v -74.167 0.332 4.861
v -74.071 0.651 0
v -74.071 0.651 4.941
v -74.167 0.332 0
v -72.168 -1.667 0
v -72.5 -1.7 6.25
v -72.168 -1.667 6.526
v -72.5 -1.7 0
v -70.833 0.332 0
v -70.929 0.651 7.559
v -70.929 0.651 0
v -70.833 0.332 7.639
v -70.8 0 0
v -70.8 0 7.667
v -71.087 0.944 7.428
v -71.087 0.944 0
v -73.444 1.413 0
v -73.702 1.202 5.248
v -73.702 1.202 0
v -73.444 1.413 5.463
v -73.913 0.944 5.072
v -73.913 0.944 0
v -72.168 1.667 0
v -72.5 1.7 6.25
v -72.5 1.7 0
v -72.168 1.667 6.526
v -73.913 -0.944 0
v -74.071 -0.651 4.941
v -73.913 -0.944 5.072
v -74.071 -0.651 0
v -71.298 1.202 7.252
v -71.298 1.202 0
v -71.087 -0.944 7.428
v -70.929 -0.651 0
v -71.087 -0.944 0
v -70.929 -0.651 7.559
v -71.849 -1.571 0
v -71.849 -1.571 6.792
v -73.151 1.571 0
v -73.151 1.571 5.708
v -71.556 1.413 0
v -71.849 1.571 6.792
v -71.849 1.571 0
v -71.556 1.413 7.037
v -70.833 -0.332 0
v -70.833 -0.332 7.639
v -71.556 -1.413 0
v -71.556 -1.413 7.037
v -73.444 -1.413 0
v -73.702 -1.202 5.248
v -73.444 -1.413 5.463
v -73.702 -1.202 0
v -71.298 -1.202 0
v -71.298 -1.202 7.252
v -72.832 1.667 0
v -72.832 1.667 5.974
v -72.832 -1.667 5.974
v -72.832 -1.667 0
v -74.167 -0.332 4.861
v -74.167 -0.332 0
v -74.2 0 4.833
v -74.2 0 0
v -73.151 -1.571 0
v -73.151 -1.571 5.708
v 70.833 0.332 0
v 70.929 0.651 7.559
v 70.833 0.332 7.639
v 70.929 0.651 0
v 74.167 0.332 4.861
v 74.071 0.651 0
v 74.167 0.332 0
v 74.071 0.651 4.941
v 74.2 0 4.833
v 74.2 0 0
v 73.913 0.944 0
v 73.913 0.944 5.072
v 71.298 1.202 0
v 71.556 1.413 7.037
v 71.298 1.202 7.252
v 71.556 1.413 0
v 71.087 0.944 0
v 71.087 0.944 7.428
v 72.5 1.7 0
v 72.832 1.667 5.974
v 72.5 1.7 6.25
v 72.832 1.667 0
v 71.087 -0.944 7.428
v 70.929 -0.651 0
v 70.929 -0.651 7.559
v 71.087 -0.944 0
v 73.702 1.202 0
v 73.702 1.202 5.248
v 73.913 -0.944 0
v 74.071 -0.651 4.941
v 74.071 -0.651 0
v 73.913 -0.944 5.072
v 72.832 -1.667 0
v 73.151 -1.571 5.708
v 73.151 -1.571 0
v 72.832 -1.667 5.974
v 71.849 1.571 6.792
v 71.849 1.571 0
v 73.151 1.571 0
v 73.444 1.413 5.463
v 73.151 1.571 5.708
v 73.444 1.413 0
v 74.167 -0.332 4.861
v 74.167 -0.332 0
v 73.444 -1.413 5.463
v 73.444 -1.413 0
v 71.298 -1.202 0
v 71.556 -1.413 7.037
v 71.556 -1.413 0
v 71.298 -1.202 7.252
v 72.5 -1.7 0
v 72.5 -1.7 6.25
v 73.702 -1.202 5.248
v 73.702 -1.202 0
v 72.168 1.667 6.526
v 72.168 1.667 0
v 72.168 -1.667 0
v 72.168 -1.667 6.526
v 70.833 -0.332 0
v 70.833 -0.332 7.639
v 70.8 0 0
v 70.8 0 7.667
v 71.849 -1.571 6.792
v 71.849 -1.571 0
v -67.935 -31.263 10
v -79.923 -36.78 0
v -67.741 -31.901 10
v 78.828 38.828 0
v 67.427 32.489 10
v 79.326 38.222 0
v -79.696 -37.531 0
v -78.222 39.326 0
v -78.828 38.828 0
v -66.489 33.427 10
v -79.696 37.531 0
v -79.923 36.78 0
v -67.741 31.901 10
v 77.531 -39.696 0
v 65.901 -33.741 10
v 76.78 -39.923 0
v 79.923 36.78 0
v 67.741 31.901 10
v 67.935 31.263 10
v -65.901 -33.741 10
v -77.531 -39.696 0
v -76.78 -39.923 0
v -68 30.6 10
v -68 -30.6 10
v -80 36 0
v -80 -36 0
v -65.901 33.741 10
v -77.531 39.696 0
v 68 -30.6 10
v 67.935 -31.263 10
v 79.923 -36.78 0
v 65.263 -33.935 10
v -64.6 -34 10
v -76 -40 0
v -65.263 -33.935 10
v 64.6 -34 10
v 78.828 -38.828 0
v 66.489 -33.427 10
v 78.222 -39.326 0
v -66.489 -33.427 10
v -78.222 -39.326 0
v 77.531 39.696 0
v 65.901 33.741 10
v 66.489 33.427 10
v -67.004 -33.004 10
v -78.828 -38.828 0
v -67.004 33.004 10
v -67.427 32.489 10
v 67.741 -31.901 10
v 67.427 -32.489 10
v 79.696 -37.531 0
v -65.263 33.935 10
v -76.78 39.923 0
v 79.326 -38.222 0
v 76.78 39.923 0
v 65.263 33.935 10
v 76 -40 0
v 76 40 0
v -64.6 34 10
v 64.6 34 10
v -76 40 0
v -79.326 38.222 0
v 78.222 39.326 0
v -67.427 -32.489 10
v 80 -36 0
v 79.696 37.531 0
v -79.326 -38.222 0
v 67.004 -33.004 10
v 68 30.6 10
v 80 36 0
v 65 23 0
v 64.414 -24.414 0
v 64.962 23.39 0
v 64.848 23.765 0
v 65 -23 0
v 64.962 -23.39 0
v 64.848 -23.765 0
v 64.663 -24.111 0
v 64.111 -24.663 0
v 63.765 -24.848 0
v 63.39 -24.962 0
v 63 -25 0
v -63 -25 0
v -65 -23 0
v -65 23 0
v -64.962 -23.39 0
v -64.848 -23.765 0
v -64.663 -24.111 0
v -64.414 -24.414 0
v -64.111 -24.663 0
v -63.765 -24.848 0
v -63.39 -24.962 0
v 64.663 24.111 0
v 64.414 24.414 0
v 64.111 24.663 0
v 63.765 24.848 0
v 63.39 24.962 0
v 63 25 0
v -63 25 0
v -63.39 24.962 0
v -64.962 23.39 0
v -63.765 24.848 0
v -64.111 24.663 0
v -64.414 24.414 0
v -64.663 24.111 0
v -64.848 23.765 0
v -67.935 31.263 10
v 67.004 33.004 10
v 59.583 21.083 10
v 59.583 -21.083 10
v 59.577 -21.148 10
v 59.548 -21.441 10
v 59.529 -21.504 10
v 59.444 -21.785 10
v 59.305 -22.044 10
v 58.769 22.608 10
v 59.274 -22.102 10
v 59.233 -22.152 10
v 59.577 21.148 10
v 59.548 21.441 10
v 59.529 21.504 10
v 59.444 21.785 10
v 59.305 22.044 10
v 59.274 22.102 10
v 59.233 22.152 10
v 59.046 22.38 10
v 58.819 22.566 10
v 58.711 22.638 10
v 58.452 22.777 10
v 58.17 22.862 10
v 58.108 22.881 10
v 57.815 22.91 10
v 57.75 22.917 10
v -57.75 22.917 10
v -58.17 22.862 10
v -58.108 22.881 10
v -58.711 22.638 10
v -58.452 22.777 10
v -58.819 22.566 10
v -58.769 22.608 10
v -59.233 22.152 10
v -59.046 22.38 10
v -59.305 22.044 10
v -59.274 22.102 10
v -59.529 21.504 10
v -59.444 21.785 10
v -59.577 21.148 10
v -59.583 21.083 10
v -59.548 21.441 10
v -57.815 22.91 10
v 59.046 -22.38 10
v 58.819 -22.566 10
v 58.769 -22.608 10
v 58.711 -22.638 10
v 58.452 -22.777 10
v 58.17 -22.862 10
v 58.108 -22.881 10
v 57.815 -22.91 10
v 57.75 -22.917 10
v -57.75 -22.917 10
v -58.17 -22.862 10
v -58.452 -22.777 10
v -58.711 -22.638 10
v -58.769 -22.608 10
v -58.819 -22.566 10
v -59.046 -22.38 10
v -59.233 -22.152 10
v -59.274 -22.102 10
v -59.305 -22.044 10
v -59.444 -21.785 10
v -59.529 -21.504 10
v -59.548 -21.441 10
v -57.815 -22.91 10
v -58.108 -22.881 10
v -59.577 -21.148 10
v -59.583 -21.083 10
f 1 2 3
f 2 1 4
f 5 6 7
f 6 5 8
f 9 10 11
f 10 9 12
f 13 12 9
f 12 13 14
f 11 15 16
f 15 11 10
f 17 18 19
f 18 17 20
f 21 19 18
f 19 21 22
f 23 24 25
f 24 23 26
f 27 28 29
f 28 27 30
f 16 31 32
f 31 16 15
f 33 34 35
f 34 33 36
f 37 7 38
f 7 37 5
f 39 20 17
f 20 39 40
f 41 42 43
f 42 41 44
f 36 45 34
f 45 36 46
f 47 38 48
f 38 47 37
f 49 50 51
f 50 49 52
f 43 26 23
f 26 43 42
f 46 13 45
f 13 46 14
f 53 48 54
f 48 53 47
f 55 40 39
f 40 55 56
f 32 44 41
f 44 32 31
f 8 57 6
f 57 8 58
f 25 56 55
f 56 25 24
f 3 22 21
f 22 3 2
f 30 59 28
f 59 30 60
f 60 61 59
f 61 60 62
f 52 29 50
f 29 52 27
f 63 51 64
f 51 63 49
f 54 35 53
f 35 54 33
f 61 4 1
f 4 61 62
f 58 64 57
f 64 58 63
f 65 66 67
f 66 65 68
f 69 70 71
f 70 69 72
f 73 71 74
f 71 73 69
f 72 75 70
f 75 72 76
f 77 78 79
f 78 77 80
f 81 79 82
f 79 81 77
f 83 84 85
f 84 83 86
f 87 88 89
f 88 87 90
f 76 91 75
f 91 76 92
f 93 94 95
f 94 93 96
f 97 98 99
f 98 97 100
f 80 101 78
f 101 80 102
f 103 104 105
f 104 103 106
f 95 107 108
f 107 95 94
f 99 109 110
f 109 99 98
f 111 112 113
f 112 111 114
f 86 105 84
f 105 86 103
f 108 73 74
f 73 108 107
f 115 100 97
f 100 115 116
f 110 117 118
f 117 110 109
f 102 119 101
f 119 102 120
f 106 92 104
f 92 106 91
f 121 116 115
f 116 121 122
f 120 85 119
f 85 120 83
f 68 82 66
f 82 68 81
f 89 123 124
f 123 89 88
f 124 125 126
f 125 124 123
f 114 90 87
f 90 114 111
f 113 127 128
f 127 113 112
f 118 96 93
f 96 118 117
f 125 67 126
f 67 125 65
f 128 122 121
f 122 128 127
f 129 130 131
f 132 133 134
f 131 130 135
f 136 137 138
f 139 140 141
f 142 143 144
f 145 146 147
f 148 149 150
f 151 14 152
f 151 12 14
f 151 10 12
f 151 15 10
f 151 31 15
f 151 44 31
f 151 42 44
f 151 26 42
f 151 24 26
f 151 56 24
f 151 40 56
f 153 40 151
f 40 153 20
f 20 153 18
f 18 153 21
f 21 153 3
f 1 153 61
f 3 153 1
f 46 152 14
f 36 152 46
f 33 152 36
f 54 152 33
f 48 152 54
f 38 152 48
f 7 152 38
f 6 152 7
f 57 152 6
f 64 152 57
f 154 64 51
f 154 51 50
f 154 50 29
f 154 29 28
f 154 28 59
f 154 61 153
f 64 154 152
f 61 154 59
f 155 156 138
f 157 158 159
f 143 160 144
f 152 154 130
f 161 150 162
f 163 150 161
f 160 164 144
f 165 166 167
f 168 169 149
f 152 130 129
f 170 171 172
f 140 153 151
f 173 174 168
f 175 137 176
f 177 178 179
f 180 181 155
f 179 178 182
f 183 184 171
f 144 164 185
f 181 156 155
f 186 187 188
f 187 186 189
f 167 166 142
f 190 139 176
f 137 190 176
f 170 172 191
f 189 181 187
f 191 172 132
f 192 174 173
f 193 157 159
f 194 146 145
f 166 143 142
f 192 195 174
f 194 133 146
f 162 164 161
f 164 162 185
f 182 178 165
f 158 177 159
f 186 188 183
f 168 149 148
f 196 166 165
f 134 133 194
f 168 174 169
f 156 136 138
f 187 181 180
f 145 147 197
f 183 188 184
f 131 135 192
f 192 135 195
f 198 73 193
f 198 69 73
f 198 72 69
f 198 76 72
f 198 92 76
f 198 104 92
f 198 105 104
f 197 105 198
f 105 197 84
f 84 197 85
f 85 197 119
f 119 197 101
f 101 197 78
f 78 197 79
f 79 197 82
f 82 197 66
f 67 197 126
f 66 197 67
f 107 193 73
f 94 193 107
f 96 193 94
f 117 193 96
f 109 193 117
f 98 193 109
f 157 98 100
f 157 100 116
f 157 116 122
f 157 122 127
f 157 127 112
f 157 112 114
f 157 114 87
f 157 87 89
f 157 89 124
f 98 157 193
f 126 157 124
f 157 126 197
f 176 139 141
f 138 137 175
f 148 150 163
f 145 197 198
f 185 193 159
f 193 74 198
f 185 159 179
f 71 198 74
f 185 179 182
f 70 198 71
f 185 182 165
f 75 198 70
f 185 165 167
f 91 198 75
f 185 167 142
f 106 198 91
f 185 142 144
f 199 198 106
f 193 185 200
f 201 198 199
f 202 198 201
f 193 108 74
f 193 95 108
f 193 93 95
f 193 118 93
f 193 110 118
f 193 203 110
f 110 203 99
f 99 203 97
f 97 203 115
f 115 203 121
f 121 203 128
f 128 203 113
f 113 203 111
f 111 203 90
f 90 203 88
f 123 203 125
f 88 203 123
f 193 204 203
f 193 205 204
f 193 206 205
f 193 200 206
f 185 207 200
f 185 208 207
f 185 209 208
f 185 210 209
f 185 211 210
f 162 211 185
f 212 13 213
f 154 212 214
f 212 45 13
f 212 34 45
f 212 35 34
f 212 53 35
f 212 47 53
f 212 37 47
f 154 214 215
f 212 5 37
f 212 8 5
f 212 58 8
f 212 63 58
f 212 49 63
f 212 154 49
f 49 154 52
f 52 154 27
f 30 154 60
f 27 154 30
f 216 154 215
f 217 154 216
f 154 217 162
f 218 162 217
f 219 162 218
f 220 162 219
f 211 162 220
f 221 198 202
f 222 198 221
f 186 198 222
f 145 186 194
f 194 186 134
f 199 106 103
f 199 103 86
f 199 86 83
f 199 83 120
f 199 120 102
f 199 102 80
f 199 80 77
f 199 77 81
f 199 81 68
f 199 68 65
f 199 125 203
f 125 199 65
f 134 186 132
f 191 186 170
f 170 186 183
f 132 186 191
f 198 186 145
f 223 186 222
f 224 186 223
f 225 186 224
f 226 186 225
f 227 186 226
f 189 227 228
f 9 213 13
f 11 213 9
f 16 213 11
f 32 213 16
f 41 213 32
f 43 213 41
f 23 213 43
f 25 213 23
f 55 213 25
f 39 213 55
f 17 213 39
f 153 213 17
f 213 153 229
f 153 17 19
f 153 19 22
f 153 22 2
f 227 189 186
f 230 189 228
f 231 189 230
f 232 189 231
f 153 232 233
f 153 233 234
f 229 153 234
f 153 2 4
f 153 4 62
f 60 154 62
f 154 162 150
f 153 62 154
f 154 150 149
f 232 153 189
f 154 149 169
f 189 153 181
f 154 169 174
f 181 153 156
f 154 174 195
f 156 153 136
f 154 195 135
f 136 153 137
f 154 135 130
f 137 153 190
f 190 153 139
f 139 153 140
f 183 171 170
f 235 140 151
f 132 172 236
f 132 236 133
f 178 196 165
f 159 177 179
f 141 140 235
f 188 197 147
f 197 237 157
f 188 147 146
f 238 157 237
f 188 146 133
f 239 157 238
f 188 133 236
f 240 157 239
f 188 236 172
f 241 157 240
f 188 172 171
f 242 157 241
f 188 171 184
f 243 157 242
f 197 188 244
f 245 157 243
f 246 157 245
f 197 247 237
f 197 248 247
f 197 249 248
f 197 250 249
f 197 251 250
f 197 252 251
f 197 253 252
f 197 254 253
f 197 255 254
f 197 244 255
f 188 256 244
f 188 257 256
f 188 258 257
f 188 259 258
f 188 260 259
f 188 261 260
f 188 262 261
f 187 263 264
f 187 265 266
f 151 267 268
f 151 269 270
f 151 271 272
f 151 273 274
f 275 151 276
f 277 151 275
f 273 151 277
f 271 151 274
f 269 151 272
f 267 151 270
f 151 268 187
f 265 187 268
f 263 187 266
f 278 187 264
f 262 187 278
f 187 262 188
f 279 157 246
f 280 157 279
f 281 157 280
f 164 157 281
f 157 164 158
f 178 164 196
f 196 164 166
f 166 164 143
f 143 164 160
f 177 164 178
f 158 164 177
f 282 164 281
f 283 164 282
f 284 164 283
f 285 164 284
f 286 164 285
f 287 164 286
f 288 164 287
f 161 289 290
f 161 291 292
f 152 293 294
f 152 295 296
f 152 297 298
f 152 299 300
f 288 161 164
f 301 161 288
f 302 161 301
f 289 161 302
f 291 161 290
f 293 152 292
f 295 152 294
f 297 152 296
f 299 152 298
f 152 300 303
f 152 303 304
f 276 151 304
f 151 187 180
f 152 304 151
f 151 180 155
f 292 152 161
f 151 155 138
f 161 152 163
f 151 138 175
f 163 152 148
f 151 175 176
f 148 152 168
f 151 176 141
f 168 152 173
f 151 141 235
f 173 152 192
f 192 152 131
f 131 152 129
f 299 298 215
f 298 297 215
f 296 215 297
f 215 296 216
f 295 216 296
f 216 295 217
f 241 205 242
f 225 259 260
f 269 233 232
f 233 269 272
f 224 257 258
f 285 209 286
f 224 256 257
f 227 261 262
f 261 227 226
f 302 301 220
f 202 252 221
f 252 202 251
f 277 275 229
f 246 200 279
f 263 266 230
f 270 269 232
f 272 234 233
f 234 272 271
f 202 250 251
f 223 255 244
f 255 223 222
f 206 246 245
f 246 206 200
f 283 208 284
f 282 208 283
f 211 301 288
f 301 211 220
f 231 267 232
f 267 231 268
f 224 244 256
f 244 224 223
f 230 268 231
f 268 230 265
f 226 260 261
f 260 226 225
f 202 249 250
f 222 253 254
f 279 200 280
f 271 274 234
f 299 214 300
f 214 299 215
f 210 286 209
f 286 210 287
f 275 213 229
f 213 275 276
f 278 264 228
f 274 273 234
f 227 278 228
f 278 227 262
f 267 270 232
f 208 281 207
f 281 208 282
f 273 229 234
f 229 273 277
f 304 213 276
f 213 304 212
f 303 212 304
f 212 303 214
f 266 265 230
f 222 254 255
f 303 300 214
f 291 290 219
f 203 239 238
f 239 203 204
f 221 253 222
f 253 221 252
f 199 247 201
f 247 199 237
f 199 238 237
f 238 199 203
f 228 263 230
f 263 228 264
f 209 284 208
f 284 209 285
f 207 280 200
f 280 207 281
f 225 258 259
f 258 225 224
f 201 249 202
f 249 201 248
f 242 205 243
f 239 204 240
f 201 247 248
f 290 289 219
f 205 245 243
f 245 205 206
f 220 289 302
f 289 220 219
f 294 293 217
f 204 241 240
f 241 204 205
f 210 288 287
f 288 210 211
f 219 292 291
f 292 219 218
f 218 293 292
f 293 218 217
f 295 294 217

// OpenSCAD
$fn = 32;

// ----------------------------------------------------------------------
// Display bezel: 160 x 80 mm frame, opening 130x50 mm
// ----------------------------------------------------------------------

// --- parameters (mm) ---
length = 160;             // frame outside length, X
width = 80;               // frame outside width, Y
frame_w = 15;             // frame width
thickness = 10;           // frame thickness
corner_r = 4;             // outside corner radius
chamfer = 0.85;           // outer wall taper
funnel = 0.9;             // inner opening taper
opening_l = 130;          // opening length
opening_w = 50;           // opening width
inner_r = 2;              // opening corner radius
hole_d = 3.4;             // mounting screw clearance
holes_per_side = 1;       // holes per short side
hole_inset = 7.5;         // hole centre inset from the outside edge

/* rounded-rectangle outlines, generated with loops */
module rounded_ring(l_nom, w_nom, r) {
  hull() {
    for (sx = [-1, 1]) for (sy = [-1, 1])
      translate([sx * (l_nom / 2 - r), sy * (w_nom / 2 - r)]) circle(r = r);
  }
}

difference() {
  /* frame body, drafted so the outer edge is a variable-depth chamfer */
  linear_extrude(height = thickness, scale = chamfer)
    rounded_ring(length, width, corner_r);
  /* viewing opening, drafted the other way for a funnel edge */
  linear_extrude(height = thickness + 2, scale = funnel)
    translate([0, 0, -1]) rounded_ring(opening_l, opening_w, inner_r);
  /* mounting screws through the frame lands */
  for (sx = [-1, 1]) for (i = [1 : holes_per_side])
    translate([sx * (length / 2 - hole_inset),
               (i - (holes_per_side + 1) / 2) * width * 0.5, -1])
      cylinder(h = thickness + 2, d = hole_d);
}
